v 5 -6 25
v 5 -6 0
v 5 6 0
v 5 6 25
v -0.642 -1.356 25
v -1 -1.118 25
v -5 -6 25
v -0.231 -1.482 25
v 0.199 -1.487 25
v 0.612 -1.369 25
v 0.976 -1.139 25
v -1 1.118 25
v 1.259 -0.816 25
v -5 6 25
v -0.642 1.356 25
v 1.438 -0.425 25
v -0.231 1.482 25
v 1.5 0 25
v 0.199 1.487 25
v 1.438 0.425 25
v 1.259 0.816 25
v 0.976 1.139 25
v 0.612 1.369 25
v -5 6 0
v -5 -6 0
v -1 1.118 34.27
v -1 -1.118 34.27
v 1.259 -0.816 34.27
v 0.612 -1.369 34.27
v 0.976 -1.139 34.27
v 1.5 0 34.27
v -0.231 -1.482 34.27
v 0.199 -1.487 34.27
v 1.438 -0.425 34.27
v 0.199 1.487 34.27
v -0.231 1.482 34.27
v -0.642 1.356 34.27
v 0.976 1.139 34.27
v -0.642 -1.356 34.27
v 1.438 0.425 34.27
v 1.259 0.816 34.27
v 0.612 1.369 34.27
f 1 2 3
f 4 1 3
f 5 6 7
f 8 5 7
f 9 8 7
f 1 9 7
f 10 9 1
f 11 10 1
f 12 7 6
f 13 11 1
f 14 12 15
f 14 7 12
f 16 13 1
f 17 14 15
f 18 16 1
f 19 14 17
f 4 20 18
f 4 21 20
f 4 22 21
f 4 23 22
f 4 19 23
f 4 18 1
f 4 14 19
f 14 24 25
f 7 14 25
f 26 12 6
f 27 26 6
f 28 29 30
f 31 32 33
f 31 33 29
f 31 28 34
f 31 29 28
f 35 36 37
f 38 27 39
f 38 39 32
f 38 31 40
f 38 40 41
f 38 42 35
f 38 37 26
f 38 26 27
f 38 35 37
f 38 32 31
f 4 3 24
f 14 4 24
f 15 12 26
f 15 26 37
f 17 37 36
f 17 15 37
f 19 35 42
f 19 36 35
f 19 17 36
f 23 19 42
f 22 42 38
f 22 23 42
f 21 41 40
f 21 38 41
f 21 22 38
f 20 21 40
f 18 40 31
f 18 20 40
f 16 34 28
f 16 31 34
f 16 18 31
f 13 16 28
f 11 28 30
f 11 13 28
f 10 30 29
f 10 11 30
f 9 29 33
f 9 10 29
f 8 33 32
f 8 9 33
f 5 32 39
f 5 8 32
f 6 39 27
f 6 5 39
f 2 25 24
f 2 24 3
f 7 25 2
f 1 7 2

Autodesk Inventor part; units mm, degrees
ref_plane "YZ Plane" through (0, 0, 0) normal (1, 0, 0) x (0, 1, 0)
ref_plane "XZ Plane" through (0, 0, 0) normal (0, 1, 0) x (-1, 0, 0)
ref_plane "XY Plane" through (0, 0, 0) normal (0, 0, 1) x (1, 0, 0)
sketch "Sketch1" plane through (0, 0, 0) normal (0, 0, 1) x (1, 0, 0)
  line L0 (-5, -6) -> (5, -6)
  line L1 (5, -6) -> (5, 6)
  line L2 (5, 6) -> (-5, 6)
  line L3 (-5, 6) -> (-5, -6)
  point P0 (0, 0)
  dimension "d0" = 10
  dimension "d1" = 12
  dimension "d2" = 5
  dimension "d3" = 6
extrude "Extrusion1" add sketch "Sketch1" along normal blind 25
sketch "Sketch2" plane through (0, 0, 25) normal (0, 0, 1) x (1, 0, 0)
  arc A0 (-1, -1.118) -> (-1, 1.118) centre (0, 0) ccw
  line L0 (-1, 1.118) -> (-1, -1.118)
  dimension "d6" = 3
extrude "Extrusion2" add sketch "Sketch2" along normal blind 9.27
properties part number "Motor"
